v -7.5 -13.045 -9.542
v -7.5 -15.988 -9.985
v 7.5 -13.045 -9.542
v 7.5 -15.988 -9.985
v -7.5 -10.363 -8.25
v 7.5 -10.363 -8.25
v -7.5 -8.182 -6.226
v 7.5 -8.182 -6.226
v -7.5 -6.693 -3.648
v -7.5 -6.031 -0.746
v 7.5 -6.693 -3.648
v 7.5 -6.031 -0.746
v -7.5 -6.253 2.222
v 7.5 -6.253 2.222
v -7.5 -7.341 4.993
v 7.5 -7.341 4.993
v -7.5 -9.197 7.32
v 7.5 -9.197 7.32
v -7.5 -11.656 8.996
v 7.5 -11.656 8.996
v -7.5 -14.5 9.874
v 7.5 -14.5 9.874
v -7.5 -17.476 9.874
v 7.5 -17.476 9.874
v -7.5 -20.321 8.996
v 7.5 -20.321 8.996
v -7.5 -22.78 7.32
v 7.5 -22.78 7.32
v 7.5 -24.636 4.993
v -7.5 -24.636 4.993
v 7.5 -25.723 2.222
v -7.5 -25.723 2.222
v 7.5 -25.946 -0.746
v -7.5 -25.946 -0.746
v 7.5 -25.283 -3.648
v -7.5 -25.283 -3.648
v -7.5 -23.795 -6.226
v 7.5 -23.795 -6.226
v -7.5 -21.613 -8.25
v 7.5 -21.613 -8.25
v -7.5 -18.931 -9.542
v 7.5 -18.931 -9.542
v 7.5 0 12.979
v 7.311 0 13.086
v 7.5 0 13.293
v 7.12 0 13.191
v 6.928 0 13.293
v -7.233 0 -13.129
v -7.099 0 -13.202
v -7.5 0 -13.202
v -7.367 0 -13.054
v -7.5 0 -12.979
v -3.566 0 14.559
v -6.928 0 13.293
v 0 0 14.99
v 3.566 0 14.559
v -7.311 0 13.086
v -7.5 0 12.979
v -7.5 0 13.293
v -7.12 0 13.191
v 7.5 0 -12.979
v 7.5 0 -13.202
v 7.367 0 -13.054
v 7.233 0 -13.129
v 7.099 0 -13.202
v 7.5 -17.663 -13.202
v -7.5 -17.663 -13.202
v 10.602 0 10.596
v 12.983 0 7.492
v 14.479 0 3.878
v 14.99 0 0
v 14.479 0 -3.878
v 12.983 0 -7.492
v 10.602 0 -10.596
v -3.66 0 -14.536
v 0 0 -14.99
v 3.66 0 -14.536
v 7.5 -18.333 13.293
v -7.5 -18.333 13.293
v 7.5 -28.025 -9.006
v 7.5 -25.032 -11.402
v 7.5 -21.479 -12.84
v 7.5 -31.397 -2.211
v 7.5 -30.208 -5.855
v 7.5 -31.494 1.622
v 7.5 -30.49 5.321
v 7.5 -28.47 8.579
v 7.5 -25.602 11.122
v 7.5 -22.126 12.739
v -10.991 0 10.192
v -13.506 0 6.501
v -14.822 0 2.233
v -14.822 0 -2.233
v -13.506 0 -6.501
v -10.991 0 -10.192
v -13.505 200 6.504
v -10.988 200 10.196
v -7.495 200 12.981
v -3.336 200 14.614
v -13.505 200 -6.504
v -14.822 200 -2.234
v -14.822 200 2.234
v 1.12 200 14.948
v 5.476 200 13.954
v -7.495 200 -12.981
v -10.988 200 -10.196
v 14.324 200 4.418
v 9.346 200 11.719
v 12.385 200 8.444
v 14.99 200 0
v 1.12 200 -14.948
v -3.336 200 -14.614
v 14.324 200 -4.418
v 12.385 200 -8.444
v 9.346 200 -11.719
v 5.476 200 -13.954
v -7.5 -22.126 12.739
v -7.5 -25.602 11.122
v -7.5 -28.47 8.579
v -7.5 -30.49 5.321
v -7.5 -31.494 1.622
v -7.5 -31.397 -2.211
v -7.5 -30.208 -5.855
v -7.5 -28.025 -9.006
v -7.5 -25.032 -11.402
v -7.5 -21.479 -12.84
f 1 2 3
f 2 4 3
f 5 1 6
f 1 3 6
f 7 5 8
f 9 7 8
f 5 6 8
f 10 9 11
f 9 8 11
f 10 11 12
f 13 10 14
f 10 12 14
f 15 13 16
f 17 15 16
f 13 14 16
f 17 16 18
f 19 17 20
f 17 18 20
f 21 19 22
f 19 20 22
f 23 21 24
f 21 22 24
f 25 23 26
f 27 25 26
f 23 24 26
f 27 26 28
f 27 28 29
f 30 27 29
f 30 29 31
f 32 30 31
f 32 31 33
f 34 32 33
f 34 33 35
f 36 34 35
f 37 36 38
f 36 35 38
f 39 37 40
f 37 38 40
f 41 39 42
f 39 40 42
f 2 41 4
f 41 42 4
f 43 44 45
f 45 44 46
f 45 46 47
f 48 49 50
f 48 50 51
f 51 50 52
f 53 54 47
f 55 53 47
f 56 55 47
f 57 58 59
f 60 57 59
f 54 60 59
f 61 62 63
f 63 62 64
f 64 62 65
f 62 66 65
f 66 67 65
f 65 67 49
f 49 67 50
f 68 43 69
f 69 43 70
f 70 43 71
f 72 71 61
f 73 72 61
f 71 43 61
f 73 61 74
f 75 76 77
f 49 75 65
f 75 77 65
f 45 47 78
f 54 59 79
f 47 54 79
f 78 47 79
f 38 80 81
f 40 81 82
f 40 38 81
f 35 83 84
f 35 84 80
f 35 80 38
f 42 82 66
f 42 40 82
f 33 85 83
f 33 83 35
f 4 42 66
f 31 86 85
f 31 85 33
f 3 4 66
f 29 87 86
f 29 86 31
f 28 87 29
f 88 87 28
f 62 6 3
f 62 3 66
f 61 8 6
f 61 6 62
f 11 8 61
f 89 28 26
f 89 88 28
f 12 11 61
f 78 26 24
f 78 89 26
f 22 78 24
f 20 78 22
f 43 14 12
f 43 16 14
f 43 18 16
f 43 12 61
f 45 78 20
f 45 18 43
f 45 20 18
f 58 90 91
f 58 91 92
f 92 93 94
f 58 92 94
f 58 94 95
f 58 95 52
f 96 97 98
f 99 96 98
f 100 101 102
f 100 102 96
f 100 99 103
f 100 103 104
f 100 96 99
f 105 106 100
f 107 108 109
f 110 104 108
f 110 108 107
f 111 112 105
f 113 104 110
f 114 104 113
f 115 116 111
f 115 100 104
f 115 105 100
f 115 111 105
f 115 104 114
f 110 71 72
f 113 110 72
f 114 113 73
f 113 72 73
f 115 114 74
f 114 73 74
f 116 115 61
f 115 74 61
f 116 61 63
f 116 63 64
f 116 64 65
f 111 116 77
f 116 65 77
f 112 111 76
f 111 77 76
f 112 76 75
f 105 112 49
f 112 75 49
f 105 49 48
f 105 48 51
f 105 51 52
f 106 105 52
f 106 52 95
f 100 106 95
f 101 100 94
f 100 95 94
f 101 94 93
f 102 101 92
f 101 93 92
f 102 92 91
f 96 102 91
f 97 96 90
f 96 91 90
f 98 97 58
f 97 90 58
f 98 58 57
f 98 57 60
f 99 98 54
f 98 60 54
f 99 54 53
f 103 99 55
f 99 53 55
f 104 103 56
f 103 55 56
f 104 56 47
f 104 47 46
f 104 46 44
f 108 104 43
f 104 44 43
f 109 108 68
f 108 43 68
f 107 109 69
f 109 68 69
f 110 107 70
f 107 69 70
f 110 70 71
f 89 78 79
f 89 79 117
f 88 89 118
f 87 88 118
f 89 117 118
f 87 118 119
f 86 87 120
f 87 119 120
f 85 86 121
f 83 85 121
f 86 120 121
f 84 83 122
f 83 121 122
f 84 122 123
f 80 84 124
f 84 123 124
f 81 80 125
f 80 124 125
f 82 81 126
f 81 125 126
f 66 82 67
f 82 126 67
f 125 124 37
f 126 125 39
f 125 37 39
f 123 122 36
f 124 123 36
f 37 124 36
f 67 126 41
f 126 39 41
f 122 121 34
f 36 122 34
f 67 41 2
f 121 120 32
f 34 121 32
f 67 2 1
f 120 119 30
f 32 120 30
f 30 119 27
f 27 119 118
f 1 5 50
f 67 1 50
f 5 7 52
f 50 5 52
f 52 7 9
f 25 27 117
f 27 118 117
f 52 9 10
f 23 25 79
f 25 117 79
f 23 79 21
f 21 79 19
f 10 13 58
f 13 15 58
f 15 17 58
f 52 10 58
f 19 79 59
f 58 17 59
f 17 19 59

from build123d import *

# Parameters (mm, degrees)
SKETCH5_R           = 14.989713258
BOSS_EXTRUDE3_DEPTH = 200
BOSS_EXTRUDE4_DEPTH = 7.5
SKETCH7_R           = 9.985206203
CUT_EXTRUDE2_DEPTH  = 20


with BuildPart() as part:
    # Sketch5 → Boss-Extrude3 (new body)
    with BuildSketch(Plane(origin=(0, 0, 0), x_dir=(1, 0, 0), z_dir=(0, 1, 0))):
        Circle(SKETCH5_R)
    extrude(amount=BOSS_EXTRUDE3_DEPTH)

    # Sketch6 → Boss-Extrude4 (add, symmetric)
    with BuildSketch(Plane(origin=(0, 0, 0), x_dir=(0, -1, 0), z_dir=(-1, 0, 0))):
        with BuildLine():
            Line((0, 13.292901933), (18.33265387, 13.292901933))
            ThreePointArc((18.33265387, 13.292901933), (31.584492176, -0.298051084), (17.663099627, -13.202315957))
            Line((17.663099627, -13.202315957), (0, -13.202315957))
            Line((0, -13.202315957), (0, 13.292901933))
        make_face()
    extrude(amount=BOSS_EXTRUDE4_DEPTH, both=True)

    # Sketch7 → Cut-Extrude2 (cut, symmetric)
    with BuildSketch(Plane(origin=(7.5, 0, 0), x_dir=(0, 0, -1), z_dir=(1, 0, 0))):
        with Locations((0, -15.988279057)):
            Circle(SKETCH7_R)
    extrude(amount=CUT_EXTRUDE2_DEPTH, both=True, mode=Mode.SUBTRACT)


solid = part.part
